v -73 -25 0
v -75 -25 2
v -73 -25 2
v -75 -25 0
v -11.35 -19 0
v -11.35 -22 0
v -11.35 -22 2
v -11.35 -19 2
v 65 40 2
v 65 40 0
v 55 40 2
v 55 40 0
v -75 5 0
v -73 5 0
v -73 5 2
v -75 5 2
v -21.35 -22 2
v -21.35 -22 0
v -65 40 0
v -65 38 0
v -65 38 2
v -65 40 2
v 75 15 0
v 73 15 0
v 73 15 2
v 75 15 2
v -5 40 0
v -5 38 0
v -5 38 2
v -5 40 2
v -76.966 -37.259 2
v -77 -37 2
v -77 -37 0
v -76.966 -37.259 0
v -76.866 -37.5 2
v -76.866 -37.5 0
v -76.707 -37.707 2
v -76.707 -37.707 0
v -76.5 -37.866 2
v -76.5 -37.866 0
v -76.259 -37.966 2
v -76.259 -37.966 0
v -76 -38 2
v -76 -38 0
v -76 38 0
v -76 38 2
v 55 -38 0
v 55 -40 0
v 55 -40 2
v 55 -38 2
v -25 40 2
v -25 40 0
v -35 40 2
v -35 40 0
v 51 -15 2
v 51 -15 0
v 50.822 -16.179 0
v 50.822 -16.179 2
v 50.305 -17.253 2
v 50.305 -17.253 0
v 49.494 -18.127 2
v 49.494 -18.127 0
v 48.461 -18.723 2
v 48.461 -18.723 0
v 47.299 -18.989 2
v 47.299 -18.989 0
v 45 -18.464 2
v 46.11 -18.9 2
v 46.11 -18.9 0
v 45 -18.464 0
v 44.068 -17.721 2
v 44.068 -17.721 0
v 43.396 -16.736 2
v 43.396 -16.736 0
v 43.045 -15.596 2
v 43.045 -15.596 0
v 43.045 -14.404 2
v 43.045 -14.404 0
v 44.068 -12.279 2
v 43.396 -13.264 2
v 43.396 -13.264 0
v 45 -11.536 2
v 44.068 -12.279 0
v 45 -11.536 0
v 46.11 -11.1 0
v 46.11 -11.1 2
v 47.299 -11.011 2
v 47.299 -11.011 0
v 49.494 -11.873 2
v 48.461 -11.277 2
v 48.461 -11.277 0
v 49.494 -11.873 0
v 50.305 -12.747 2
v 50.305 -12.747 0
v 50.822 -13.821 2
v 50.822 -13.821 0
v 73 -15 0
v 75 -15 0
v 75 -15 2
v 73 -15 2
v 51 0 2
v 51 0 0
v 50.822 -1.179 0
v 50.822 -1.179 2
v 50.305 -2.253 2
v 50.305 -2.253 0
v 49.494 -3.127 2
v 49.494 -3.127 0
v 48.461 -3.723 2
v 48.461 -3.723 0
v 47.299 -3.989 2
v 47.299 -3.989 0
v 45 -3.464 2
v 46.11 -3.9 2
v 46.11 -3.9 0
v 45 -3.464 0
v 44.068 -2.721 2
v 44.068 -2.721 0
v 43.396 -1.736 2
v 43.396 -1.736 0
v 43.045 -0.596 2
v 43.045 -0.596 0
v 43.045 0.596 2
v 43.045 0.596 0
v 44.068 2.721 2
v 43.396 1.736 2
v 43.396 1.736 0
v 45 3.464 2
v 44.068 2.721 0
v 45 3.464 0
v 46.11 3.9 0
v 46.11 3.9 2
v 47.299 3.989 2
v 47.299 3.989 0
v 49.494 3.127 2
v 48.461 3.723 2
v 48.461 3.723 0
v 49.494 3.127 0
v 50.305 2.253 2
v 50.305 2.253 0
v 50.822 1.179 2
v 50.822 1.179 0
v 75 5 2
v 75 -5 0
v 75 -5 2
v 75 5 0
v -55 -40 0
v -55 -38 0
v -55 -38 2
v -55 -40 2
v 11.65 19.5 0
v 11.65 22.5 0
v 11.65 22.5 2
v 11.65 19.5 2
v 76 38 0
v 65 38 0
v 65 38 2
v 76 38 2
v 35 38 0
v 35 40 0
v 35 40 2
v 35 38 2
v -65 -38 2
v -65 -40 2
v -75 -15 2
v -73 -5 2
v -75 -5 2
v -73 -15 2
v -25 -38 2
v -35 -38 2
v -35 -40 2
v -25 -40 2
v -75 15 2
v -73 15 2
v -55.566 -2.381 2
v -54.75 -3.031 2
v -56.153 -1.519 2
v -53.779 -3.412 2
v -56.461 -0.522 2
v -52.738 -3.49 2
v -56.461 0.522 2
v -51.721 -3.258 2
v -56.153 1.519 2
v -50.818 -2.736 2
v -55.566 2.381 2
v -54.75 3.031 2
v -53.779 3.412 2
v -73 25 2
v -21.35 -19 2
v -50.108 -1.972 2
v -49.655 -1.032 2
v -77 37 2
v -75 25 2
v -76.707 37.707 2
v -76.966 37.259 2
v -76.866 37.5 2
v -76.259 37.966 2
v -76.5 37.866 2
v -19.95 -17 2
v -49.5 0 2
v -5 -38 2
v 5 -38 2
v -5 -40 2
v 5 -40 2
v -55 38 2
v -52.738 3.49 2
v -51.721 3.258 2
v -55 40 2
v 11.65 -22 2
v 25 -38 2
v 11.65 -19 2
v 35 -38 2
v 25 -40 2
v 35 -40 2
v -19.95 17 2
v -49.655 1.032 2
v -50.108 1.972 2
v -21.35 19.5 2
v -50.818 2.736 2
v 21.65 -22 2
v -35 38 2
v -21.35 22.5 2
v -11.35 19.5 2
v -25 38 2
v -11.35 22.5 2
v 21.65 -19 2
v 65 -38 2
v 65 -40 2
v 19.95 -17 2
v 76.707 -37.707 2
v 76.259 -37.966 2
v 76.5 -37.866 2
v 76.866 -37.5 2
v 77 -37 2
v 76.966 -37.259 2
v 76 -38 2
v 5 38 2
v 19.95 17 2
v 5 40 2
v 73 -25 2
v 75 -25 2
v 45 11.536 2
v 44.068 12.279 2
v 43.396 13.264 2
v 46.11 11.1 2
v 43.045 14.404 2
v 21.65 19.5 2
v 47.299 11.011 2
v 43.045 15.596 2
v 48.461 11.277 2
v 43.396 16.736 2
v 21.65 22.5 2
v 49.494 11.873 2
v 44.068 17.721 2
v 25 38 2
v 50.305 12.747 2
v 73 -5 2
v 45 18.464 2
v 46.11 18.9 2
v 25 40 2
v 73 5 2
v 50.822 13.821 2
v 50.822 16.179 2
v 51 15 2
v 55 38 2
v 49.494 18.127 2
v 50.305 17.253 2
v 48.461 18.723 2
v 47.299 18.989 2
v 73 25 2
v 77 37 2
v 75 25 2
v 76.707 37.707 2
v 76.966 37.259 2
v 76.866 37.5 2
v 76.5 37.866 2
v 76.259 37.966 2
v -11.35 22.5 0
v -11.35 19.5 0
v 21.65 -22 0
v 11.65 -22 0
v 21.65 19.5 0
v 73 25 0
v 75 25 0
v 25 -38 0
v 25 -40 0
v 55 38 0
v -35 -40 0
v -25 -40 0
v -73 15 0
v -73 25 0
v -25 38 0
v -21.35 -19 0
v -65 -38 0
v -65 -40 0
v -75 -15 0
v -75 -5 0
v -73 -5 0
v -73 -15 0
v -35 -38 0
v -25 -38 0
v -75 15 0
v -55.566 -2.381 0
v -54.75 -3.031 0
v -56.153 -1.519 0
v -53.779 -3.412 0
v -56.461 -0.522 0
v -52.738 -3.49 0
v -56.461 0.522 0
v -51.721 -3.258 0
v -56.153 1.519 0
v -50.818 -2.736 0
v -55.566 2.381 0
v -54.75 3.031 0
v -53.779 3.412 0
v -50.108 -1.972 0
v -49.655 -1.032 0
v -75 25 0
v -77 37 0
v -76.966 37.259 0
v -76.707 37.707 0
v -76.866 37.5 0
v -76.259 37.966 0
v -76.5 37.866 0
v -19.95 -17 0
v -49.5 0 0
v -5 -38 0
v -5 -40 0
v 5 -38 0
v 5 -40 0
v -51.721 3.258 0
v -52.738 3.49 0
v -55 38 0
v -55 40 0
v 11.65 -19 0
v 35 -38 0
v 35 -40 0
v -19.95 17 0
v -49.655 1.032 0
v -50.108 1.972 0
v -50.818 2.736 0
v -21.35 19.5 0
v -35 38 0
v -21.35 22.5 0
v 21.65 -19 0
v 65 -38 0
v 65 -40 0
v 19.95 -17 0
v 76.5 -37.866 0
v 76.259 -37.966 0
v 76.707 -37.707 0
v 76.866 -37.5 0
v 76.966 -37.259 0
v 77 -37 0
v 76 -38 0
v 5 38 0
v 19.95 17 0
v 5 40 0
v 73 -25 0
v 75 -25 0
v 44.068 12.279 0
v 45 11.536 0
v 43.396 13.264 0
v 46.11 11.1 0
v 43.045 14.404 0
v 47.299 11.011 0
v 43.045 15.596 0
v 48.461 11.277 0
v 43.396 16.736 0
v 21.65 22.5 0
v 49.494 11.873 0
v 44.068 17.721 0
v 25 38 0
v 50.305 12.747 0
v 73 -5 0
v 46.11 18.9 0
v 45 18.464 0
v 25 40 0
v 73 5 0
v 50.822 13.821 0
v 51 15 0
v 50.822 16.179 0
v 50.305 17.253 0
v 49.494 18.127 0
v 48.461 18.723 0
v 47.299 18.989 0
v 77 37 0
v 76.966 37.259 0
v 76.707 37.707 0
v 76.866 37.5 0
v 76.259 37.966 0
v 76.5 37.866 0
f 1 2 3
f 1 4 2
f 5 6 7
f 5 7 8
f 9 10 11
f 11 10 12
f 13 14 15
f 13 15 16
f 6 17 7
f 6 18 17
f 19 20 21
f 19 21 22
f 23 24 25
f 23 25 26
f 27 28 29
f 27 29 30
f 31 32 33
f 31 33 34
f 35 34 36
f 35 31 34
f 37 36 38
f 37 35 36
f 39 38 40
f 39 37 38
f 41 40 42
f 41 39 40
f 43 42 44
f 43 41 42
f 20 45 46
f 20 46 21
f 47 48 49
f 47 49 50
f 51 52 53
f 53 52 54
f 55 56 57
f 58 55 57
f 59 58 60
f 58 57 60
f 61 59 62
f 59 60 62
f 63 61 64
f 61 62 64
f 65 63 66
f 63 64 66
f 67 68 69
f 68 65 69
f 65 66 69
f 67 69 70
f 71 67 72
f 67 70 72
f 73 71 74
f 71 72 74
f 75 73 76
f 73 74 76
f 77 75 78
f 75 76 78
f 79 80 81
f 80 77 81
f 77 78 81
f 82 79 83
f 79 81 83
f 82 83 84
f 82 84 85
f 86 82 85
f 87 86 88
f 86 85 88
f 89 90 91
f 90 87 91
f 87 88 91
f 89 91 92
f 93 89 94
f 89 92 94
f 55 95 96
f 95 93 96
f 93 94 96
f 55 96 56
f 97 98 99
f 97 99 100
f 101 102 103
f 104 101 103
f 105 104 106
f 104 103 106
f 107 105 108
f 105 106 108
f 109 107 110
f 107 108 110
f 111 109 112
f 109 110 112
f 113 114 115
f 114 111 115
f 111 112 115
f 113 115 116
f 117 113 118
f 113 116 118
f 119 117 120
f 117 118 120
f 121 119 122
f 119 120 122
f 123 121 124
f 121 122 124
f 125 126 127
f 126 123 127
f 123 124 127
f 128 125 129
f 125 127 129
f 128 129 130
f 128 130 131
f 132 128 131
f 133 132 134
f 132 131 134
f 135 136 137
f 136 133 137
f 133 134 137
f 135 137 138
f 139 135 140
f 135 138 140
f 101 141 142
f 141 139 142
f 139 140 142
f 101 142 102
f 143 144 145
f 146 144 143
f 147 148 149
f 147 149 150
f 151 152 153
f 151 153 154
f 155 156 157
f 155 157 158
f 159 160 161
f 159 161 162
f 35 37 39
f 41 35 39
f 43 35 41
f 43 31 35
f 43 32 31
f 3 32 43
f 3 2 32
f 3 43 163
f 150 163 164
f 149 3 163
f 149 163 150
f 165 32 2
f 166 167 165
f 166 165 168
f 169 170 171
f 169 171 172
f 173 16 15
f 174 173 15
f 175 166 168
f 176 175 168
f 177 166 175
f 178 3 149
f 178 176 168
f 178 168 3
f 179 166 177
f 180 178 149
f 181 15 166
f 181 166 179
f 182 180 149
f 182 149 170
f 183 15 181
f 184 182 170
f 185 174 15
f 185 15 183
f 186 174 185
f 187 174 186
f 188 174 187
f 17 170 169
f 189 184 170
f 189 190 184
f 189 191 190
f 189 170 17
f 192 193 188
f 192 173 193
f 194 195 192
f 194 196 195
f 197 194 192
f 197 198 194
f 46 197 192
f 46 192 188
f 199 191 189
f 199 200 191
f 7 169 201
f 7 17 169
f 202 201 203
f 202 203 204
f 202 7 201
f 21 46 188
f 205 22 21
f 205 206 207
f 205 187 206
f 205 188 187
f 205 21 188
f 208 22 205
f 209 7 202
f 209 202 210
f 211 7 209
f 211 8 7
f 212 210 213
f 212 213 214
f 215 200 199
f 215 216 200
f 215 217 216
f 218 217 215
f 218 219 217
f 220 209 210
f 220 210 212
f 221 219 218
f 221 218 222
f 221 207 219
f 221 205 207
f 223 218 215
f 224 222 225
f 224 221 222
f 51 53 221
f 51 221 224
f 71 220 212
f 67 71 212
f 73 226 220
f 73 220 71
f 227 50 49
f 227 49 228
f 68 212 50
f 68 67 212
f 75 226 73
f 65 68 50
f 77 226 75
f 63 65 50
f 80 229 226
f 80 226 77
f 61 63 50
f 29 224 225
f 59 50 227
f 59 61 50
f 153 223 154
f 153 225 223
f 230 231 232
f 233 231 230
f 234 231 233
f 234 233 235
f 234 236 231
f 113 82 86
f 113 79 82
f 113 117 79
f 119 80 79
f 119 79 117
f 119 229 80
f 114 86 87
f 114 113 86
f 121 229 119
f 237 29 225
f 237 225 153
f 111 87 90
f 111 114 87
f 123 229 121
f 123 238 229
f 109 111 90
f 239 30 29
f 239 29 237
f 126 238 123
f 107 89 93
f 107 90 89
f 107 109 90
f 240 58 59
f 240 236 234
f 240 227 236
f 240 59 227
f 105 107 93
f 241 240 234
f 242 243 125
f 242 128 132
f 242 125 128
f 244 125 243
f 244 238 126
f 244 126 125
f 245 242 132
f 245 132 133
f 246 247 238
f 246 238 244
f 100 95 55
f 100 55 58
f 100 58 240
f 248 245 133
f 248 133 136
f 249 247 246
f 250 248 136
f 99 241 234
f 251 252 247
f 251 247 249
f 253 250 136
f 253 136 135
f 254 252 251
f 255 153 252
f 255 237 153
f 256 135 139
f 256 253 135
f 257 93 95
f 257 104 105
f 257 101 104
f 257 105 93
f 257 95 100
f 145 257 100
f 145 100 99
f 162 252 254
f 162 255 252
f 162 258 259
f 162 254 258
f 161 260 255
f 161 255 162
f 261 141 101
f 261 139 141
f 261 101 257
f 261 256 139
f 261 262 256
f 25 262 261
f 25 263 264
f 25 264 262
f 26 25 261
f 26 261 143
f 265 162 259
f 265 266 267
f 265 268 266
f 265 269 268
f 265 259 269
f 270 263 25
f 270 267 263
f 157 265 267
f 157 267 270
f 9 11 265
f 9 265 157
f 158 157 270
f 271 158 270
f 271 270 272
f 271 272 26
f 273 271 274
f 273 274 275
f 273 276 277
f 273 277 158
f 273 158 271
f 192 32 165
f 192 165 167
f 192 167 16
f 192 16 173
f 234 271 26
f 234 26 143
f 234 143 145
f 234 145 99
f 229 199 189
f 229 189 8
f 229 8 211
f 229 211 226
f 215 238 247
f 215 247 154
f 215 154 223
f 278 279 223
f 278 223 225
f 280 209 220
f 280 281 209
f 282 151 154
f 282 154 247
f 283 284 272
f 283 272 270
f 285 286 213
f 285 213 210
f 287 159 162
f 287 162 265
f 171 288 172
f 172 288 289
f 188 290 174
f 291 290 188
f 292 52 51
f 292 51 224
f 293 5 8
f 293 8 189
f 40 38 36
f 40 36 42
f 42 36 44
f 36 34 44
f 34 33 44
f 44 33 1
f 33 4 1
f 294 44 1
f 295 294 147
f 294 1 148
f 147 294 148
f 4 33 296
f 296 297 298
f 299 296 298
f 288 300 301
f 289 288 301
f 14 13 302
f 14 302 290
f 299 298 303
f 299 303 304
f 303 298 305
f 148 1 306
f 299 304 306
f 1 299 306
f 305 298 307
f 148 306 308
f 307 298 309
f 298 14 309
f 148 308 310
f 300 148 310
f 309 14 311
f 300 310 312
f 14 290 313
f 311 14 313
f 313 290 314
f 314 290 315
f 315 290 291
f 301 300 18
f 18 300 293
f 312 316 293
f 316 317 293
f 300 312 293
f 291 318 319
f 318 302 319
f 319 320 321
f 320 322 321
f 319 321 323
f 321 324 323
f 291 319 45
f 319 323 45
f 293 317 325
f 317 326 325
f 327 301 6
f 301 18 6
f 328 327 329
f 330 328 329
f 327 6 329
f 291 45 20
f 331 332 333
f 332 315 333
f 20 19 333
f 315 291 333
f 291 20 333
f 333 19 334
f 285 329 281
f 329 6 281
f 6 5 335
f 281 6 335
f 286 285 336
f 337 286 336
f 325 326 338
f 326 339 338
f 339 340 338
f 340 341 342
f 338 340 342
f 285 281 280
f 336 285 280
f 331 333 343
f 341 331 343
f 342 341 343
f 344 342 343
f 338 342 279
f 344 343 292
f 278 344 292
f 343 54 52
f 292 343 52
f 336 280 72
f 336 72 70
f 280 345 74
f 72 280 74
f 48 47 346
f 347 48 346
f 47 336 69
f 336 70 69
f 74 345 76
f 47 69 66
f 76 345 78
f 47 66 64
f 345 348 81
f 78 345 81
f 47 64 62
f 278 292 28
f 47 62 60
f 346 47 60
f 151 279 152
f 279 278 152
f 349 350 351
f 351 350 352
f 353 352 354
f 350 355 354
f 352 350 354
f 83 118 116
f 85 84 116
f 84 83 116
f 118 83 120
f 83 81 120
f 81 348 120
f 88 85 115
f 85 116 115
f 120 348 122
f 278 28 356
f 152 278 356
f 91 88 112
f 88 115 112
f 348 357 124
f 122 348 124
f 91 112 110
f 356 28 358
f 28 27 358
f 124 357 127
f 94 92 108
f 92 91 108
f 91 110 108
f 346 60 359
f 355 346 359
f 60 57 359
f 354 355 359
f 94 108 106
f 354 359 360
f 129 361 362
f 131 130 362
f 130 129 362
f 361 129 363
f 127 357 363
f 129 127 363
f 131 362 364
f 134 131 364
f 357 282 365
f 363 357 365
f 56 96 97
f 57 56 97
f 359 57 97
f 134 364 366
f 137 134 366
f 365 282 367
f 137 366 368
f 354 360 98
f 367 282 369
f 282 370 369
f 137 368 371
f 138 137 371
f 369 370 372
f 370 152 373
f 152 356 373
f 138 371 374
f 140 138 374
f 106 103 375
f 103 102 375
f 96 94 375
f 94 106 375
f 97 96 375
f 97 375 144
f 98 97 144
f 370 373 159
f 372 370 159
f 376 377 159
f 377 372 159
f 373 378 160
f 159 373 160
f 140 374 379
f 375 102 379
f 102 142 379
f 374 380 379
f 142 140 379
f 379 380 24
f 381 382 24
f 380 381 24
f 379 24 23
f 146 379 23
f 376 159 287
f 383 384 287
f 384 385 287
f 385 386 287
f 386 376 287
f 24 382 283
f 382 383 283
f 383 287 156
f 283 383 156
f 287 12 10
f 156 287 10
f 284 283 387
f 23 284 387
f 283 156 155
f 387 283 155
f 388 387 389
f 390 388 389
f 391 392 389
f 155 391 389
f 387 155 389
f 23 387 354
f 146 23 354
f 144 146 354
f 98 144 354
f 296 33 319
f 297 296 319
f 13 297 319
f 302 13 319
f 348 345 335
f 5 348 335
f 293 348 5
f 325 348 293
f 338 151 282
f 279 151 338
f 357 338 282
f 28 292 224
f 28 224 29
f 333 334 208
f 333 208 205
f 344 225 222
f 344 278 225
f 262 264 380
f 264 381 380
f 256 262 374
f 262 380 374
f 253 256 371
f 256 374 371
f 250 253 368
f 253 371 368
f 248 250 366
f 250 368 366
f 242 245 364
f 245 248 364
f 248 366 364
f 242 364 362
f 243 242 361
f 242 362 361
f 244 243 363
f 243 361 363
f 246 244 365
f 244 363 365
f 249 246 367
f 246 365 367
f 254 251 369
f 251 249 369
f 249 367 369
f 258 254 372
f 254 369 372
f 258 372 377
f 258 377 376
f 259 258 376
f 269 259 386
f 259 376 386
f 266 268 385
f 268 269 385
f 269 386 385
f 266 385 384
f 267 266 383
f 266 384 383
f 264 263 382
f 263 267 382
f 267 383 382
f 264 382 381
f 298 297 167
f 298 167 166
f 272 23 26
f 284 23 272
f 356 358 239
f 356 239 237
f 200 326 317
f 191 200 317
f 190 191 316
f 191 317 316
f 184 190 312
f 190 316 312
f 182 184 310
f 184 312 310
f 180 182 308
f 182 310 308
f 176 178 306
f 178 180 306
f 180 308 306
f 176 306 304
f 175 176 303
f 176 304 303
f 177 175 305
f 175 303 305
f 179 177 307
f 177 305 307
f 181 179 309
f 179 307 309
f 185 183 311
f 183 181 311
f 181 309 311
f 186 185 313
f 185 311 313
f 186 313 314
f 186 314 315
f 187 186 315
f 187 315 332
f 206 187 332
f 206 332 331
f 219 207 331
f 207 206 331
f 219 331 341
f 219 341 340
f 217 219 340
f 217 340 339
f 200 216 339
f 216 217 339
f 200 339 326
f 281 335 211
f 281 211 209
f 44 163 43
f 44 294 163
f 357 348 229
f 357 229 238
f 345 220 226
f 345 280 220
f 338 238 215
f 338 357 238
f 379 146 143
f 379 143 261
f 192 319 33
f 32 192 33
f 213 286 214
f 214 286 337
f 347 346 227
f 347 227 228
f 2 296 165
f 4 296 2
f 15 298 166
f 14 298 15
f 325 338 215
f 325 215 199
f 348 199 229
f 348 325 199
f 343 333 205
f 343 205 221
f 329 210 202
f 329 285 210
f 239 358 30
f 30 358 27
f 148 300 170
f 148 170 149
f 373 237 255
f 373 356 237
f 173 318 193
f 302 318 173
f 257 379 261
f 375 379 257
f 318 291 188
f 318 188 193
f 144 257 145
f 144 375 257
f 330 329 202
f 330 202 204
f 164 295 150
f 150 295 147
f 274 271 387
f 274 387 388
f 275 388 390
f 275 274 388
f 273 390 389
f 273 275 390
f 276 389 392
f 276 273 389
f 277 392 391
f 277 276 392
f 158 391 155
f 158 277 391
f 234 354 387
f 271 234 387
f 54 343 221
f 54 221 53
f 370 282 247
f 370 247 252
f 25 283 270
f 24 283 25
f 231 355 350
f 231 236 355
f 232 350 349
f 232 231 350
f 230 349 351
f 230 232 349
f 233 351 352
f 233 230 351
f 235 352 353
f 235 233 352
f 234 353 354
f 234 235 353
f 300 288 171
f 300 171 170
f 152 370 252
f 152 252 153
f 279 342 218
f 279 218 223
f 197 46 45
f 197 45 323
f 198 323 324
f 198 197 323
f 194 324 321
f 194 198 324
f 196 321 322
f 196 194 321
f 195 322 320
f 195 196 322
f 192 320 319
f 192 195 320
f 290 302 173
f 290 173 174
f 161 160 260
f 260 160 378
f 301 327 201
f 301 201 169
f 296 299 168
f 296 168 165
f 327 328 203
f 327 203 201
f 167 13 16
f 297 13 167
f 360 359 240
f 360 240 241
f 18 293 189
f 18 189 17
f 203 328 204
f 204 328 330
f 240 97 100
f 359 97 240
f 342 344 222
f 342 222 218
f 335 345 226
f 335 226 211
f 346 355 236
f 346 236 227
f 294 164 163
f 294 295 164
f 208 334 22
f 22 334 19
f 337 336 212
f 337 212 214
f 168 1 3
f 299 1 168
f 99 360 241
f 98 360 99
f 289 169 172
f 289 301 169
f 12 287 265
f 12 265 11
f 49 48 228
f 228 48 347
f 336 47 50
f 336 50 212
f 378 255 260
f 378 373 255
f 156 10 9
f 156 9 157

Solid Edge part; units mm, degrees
sketch "Sketch1" plane through (0, 0, 0) normal (0, 0, 1) x (1, 0, 0)
  line L0 (77, -40) -> (77, 40)
  line L1 (77, 40) -> (-77, 40)
  line L2 (-77, 40) -> (-77, -40)
  line L3 (-77, -40) -> (77, -40)
extrude "Protrusion1" add sketch "Sketch1" along normal blind 2
sketch "Sketch2" plane through (0, 0, 0) normal (0, 0, 1) x (1, 0, 0)
  line L0 (-77, 38) -> (-65, 38)
  line L1 (-65, 38) -> (-65, 40)
  line L2 (-65, 40) -> (-77, 40)
  line L3 (-77, 40) -> (-77, 38)
  line L4 (-55, 38) -> (-35, 38)
  line L5 (-35, 38) -> (-35, 40)
  line L6 (-35, 40) -> (-55, 40)
  line L7 (-55, 40) -> (-55, 38)
  line L8 (-25, 38) -> (-5, 38)
  line L9 (-5, 38) -> (-5, 40)
  line L10 (-5, 40) -> (-25, 40)
  line L11 (-25, 40) -> (-25, 38)
  line L12 (5, 38) -> (25, 38)
  line L13 (25, 38) -> (25, 40)
  line L14 (25, 40) -> (5, 40)
  line L15 (5, 40) -> (5, 38)
  line L16 (35, 38) -> (55, 38)
  line L17 (55, 38) -> (55, 40)
  line L18 (55, 40) -> (35, 40)
  line L19 (35, 40) -> (35, 38)
  line L20 (65, 38) -> (77, 38)
  line L21 (77, 40) -> (77, 38)
  line L22 (77, 40) -> (65, 40)
  line L23 (65, 40) -> (65, 38)
  line L24 (73, 25) -> (73, 15)
  line L25 (73, 15) -> (75, 15)
  line L26 (75, 15) -> (75, 25)
  line L27 (75, 25) -> (73, 25)
  line L28 (73, 5) -> (73, -5)
  line L29 (73, -5) -> (75, -5)
  line L30 (75, -5) -> (75, 5)
  line L31 (75, 5) -> (73, 5)
  line L32 (73, -15) -> (73, -25)
  line L33 (73, -25) -> (75, -25)
  line L34 (75, -25) -> (75, -15)
  line L35 (75, -15) -> (73, -15)
  line L36 (77, -38) -> (65, -38)
  line L37 (65, -38) -> (65, -40)
  line L38 (65, -40) -> (77, -40)
  line L39 (77, -38) -> (77, -40)
  line L40 (55, -38) -> (35, -38)
  line L41 (35, -38) -> (35, -40)
  line L42 (35, -40) -> (55, -40)
  line L43 (55, -40) -> (55, -38)
  line L44 (25, -38) -> (5, -38)
  line L45 (5, -38) -> (5, -40)
  line L46 (5, -40) -> (25, -40)
  line L47 (25, -40) -> (25, -38)
  line L48 (-5, -38) -> (-25, -38)
  line L49 (-25, -38) -> (-25, -40)
  line L50 (-25, -40) -> (-5, -40)
  line L51 (-5, -40) -> (-5, -38)
  line L52 (-35, -38) -> (-55, -38)
  line L53 (-55, -38) -> (-55, -40)
  line L54 (-55, -40) -> (-35, -40)
  line L55 (-35, -40) -> (-35, -38)
  line L56 (-65, -38) -> (-77, -38)
  line L57 (-77, -40) -> (-77, -38)
  line L58 (-77, -40) -> (-65, -40)
  line L59 (-65, -40) -> (-65, -38)
  line L60 (-73, -25) -> (-73, -15)
  line L61 (-73, -15) -> (-75, -15)
  line L62 (-75, -15) -> (-75, -25)
  line L63 (-75, -25) -> (-73, -25)
  line L64 (-73, -5) -> (-73, 5)
  line L65 (-73, 5) -> (-75, 5)
  line L66 (-75, 5) -> (-75, -5)
  line L67 (-75, -5) -> (-73, -5)
  line L68 (-73, 15) -> (-73, 25)
  line L69 (-73, 25) -> (-75, 25)
  line L70 (-75, 25) -> (-75, 15)
  line L71 (-75, 15) -> (-73, 15)
  dimension "D1" = 20
  dimension "D2" = 2
  dimension "D3" = 20
  dimension "D4" = 2
  dimension "D5" = 20
  dimension "D6" = 2
  dimension "D7" = 12
  dimension "D8" = 2
  dimension "D9" = 20
  dimension "D10" = 2
  dimension "D11" = 20
  dimension "D12" = 2
  dimension "D13" = 20
  dimension "D14" = 2
  dimension "D15" = 12
  dimension "D16" = 2
  dimension "D17" = 10
  dimension "D18" = 10
  dimension "D19" = 10
  dimension "D20" = 20
  dimension "D21" = 2
  dimension "D22" = 10
  dimension "D23" = 10
  dimension "D24" = 10
  dimension "D25" = 10
  dimension "D26" = 20
  dimension "D27" = 2
  dimension "D28" = 10
  dimension "D29" = 10
  dimension "D30" = 10
  dimension "D31" = 2
  dimension "D32" = 10
  dimension "D33" = 2
  dimension "D34" = 10
  dimension "D35" = 2
  dimension "D36" = 10
  dimension "D37" = 2
  dimension "D38" = 10
  dimension "D39" = 2
  dimension "D40" = 10
  dimension "D41" = 2
  dimension "D42" = 10
  dimension "D43" = 2
  dimension "D44" = 2
  dimension "D45" = 2
  dimension "D46" = 15
  dimension "D47" = 10
  dimension "D48" = 10
  dimension "D49" = 15
  dimension "D50" = 10
  dimension "D51" = 15
  dimension "D52" = 2
  dimension "D53" = 2
  dimension "D54" = 2
  dimension "D55" = 10
  dimension "D56" = 15
extrude "ExtrudedCutout_1" cut sketch "Sketch2" along normal blind 2
sketch "Sketch3" plane through (0, 0, 0) normal (0, 0, 1) x (1, 0, 0)
  line L0 (19.95, 17) -> (-19.95, 17)
  line L1 (-19.95, 17) -> (-19.95, -17)
  line L2 (-19.95, -17) -> (19.95, -17)
  line L3 (19.95, -17) -> (19.95, 17)
extrude "ExtrudedCutout_2" cut sketch "Sketch3" along normal blind 2
sketch "Sketch4" plane through (0, 0, 0) normal (0, 0, 1) x (1, 0, 0)
  line L0 (-11.35, 22.5) -> (-21.35, 22.5)
  line L1 (-21.35, 22.5) -> (-21.35, 19.5)
  line L2 (-21.35, 19.5) -> (-11.35, 19.5)
  line L3 (-11.35, 19.5) -> (-11.35, 22.5)
  line L4 (21.65, 22.5) -> (11.65, 22.5)
  line L5 (11.65, 22.5) -> (11.65, 19.5)
  line L6 (11.65, 19.5) -> (21.65, 19.5)
  line L7 (21.65, 19.5) -> (21.65, 22.5)
  line L8 (-11.35, -19) -> (-21.35, -19)
  line L9 (-21.35, -19) -> (-21.35, -22)
  line L10 (-21.35, -22) -> (-11.35, -22)
  line L11 (-11.35, -22) -> (-11.35, -19)
  line L12 (21.65, -19) -> (11.65, -19)
  line L13 (11.65, -19) -> (11.65, -22)
  line L14 (11.65, -22) -> (21.65, -22)
  line L15 (21.65, -22) -> (21.65, -19)
  dimension "D1" = 45
  dimension "D2" = 45
  dimension "D3" = 39.9
  dimension "D4" = 34
  dimension "D5" = 2.7
  dimension "D6" = 10
  dimension "D7" = 3
  dimension "D8" = 10
  dimension "D9" = 3
  dimension "D10" = 10
  dimension "D11" = 3
  dimension "D12" = 10
  dimension "D13" = 3
  dimension "D14" = 2.5
  dimension "D15" = 2.5
  dimension "D16" = 2
  dimension "D17" = 2
  dimension "D18" = 1
  dimension "D19" = 1
  dimension "D20" = 1
  dimension "D21" = 1
extrude "ExtrudedCutout_3" cut sketch "Sketch4" along normal blind 2
sketch "Sketch5" plane through (0, 0, 0) normal (0, 0, 1) x (1, 0, 0)
  circle A0 centre (47, 15) radius 4
  circle A1 centre (47, 0) radius 4
  circle A2 centre (47, -15) radius 4
  circle A3 centre (-53, 0) radius 3.5
  dimension "D1" = 8
  dimension "D2" = 8
  dimension "D3" = 8
  dimension "D4" = 15
  dimension "D5" = 15
  dimension "D6" = 23
  dimension "D7" = 30
  dimension "D8" = 7
  dimension "D9" = 38
  dimension "D10" = 20
extrude "ExtrudedCutout_7" cut sketch "Sketch5" along normal blind 2
fillet "Round_1" radius 1 4 edges at (-77, -38, 1) (-77, 38, 1) (77, -38, 1) (77, 38, 1)
properties material "Acrylic, high impact grade"
